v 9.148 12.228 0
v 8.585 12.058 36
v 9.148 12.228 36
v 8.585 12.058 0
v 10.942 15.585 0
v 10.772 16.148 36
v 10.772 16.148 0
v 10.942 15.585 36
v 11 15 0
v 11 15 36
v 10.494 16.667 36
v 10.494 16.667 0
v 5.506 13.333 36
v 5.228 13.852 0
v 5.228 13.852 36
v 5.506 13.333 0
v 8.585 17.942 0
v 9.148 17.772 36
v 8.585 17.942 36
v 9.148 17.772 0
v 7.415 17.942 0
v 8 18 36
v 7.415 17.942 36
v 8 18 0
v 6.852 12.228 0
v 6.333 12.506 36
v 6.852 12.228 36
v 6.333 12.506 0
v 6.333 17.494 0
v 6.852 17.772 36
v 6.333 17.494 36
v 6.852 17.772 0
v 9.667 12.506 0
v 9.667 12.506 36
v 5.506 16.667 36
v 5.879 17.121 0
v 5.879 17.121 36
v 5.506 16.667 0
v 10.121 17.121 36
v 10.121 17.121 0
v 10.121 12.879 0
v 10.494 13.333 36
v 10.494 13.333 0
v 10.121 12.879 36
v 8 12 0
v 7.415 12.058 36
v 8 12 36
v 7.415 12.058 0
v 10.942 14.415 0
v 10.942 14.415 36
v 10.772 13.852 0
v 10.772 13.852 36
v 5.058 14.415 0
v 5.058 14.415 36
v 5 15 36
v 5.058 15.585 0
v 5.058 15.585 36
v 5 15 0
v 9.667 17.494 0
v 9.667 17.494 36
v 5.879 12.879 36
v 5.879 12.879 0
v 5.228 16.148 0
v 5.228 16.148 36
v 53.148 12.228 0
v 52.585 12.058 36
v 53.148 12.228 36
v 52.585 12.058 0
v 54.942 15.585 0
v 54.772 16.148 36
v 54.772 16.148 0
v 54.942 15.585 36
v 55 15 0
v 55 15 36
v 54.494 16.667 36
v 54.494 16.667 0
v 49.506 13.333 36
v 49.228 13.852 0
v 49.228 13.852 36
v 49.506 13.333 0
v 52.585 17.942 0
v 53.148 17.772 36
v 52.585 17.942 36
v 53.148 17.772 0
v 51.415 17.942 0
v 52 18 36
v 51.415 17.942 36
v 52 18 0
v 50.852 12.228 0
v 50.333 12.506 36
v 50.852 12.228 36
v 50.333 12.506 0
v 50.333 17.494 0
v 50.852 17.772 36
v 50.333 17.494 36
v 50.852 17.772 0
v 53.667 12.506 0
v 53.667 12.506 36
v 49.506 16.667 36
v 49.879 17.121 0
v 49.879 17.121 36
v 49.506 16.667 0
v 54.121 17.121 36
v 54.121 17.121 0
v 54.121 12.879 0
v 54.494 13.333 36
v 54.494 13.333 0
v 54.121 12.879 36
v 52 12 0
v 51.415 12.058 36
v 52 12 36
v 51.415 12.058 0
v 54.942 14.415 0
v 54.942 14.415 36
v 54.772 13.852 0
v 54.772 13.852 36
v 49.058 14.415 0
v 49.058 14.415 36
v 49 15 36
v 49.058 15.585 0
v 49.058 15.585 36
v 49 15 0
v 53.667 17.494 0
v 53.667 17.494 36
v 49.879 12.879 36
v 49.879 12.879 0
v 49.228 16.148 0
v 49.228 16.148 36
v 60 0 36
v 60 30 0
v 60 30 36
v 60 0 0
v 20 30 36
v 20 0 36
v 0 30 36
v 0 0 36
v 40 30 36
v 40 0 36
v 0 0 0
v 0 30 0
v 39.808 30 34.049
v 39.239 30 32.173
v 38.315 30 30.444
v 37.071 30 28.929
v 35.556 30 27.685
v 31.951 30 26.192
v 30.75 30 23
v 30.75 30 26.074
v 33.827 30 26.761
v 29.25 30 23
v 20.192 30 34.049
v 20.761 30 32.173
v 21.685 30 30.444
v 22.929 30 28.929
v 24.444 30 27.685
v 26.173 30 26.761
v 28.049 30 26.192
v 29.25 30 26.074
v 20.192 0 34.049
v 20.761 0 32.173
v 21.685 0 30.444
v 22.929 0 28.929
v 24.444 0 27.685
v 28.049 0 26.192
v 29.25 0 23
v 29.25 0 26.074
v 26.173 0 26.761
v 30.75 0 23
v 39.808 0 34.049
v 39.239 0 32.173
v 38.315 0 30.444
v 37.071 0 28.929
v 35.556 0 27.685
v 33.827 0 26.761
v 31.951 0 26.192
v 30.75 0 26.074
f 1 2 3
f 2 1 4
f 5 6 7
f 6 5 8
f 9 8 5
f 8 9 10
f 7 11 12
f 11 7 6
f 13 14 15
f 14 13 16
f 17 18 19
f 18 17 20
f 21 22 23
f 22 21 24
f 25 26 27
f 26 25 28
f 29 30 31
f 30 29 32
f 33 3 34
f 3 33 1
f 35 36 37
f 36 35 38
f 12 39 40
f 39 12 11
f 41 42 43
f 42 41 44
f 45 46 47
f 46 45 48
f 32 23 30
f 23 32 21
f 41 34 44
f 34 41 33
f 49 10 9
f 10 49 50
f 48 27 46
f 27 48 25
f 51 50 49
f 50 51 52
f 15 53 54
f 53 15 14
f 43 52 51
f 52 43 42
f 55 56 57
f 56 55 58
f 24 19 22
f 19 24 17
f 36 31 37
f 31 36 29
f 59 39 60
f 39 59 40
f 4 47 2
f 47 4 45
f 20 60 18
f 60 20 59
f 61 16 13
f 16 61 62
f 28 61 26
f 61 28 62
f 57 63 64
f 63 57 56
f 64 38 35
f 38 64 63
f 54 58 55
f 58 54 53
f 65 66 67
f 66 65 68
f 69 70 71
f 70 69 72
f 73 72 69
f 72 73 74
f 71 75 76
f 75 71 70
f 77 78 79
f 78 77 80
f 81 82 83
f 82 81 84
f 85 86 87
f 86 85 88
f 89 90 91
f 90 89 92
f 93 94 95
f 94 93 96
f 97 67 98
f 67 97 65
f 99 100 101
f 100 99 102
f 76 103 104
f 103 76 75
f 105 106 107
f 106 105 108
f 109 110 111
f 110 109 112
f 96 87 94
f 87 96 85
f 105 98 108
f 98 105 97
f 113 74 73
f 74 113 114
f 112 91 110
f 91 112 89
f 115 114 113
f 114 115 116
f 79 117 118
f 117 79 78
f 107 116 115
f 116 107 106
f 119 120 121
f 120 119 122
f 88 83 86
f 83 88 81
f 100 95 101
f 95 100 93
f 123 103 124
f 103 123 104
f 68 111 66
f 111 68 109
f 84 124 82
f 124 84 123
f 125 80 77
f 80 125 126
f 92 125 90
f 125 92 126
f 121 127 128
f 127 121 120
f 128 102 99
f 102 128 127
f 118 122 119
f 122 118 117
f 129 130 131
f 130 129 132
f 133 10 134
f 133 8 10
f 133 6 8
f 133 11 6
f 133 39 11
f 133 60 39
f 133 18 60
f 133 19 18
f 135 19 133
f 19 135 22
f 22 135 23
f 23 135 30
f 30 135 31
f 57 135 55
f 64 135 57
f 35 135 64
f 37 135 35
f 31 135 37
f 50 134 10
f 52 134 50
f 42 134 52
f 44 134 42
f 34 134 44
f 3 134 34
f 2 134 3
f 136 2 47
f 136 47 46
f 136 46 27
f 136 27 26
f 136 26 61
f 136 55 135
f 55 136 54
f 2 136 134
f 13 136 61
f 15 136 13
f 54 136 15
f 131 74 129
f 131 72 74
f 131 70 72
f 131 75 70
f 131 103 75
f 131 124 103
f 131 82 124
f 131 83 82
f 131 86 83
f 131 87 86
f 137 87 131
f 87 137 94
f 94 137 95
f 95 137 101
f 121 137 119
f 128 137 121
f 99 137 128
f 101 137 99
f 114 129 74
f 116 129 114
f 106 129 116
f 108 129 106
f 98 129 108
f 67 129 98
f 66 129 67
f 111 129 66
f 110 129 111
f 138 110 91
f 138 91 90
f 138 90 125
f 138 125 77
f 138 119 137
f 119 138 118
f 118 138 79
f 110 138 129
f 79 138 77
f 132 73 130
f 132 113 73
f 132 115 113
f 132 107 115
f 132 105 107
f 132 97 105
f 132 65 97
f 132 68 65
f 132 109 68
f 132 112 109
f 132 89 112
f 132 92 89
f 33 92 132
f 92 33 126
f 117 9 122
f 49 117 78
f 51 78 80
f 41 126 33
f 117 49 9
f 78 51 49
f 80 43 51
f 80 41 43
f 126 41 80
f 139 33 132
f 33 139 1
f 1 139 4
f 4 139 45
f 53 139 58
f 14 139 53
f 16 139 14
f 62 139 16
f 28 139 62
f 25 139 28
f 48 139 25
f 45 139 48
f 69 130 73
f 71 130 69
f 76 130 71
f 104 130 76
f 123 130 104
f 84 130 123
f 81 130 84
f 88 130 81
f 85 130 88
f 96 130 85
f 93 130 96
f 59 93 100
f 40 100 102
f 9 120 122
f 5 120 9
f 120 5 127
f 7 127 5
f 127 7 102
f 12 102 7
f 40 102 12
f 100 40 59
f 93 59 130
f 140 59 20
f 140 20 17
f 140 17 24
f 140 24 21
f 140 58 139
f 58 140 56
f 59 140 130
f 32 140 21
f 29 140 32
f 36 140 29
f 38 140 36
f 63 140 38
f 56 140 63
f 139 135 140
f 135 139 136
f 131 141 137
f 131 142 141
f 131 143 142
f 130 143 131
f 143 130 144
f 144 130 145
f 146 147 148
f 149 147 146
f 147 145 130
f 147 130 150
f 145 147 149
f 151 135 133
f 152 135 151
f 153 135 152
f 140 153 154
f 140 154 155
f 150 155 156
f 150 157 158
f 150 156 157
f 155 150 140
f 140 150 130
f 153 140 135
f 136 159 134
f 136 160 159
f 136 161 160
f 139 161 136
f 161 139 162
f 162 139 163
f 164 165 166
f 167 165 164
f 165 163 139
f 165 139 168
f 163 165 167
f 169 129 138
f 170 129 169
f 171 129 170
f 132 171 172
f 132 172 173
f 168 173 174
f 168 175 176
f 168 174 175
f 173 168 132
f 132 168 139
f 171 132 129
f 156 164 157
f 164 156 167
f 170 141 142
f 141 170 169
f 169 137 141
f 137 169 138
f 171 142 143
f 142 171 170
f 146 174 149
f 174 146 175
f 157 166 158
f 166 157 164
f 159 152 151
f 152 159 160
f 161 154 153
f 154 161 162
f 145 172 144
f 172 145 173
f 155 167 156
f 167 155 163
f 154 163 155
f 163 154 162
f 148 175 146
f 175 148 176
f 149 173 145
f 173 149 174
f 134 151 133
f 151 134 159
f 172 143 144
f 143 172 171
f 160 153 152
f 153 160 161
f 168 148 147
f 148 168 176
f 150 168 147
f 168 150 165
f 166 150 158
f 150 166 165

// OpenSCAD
$fn = 32;

// ----------------------------------------------------------------------
// Saddle clamp: split shaft clamp
// ----------------------------------------------------------------------

// --- parameters (mm) ---
blk_l = 60;               // block length, X
blk_w = 30;               // block width, Y
blk_h = 36;               // block height
clamp_r = 10;             // shaft groove radius
hole_r = 3;               // bolt hole radius
hole_m = 8;               // bolt hole margin from the ends
saw_w = 1.5;              // saw kerf width

saw_depth = clamp_r + 3;  // saw kerf depth

difference() {
  cube([blk_l, blk_w, blk_h]);
  translate([blk_l / 2, -1, blk_h])
    rotate([-90, 0, 0])
      cylinder(h = blk_w + 2, r = clamp_r);
  for (sx = [0, 1])
    translate([sx ? blk_l - hole_m : hole_m, blk_w / 2, -1])
      cylinder(r = hole_r, h = blk_h + 2);
  translate([blk_l / 2 - saw_w / 2, -1, blk_h - saw_depth])
    cube([saw_w, blk_w + 2, saw_depth + 1]);
}
